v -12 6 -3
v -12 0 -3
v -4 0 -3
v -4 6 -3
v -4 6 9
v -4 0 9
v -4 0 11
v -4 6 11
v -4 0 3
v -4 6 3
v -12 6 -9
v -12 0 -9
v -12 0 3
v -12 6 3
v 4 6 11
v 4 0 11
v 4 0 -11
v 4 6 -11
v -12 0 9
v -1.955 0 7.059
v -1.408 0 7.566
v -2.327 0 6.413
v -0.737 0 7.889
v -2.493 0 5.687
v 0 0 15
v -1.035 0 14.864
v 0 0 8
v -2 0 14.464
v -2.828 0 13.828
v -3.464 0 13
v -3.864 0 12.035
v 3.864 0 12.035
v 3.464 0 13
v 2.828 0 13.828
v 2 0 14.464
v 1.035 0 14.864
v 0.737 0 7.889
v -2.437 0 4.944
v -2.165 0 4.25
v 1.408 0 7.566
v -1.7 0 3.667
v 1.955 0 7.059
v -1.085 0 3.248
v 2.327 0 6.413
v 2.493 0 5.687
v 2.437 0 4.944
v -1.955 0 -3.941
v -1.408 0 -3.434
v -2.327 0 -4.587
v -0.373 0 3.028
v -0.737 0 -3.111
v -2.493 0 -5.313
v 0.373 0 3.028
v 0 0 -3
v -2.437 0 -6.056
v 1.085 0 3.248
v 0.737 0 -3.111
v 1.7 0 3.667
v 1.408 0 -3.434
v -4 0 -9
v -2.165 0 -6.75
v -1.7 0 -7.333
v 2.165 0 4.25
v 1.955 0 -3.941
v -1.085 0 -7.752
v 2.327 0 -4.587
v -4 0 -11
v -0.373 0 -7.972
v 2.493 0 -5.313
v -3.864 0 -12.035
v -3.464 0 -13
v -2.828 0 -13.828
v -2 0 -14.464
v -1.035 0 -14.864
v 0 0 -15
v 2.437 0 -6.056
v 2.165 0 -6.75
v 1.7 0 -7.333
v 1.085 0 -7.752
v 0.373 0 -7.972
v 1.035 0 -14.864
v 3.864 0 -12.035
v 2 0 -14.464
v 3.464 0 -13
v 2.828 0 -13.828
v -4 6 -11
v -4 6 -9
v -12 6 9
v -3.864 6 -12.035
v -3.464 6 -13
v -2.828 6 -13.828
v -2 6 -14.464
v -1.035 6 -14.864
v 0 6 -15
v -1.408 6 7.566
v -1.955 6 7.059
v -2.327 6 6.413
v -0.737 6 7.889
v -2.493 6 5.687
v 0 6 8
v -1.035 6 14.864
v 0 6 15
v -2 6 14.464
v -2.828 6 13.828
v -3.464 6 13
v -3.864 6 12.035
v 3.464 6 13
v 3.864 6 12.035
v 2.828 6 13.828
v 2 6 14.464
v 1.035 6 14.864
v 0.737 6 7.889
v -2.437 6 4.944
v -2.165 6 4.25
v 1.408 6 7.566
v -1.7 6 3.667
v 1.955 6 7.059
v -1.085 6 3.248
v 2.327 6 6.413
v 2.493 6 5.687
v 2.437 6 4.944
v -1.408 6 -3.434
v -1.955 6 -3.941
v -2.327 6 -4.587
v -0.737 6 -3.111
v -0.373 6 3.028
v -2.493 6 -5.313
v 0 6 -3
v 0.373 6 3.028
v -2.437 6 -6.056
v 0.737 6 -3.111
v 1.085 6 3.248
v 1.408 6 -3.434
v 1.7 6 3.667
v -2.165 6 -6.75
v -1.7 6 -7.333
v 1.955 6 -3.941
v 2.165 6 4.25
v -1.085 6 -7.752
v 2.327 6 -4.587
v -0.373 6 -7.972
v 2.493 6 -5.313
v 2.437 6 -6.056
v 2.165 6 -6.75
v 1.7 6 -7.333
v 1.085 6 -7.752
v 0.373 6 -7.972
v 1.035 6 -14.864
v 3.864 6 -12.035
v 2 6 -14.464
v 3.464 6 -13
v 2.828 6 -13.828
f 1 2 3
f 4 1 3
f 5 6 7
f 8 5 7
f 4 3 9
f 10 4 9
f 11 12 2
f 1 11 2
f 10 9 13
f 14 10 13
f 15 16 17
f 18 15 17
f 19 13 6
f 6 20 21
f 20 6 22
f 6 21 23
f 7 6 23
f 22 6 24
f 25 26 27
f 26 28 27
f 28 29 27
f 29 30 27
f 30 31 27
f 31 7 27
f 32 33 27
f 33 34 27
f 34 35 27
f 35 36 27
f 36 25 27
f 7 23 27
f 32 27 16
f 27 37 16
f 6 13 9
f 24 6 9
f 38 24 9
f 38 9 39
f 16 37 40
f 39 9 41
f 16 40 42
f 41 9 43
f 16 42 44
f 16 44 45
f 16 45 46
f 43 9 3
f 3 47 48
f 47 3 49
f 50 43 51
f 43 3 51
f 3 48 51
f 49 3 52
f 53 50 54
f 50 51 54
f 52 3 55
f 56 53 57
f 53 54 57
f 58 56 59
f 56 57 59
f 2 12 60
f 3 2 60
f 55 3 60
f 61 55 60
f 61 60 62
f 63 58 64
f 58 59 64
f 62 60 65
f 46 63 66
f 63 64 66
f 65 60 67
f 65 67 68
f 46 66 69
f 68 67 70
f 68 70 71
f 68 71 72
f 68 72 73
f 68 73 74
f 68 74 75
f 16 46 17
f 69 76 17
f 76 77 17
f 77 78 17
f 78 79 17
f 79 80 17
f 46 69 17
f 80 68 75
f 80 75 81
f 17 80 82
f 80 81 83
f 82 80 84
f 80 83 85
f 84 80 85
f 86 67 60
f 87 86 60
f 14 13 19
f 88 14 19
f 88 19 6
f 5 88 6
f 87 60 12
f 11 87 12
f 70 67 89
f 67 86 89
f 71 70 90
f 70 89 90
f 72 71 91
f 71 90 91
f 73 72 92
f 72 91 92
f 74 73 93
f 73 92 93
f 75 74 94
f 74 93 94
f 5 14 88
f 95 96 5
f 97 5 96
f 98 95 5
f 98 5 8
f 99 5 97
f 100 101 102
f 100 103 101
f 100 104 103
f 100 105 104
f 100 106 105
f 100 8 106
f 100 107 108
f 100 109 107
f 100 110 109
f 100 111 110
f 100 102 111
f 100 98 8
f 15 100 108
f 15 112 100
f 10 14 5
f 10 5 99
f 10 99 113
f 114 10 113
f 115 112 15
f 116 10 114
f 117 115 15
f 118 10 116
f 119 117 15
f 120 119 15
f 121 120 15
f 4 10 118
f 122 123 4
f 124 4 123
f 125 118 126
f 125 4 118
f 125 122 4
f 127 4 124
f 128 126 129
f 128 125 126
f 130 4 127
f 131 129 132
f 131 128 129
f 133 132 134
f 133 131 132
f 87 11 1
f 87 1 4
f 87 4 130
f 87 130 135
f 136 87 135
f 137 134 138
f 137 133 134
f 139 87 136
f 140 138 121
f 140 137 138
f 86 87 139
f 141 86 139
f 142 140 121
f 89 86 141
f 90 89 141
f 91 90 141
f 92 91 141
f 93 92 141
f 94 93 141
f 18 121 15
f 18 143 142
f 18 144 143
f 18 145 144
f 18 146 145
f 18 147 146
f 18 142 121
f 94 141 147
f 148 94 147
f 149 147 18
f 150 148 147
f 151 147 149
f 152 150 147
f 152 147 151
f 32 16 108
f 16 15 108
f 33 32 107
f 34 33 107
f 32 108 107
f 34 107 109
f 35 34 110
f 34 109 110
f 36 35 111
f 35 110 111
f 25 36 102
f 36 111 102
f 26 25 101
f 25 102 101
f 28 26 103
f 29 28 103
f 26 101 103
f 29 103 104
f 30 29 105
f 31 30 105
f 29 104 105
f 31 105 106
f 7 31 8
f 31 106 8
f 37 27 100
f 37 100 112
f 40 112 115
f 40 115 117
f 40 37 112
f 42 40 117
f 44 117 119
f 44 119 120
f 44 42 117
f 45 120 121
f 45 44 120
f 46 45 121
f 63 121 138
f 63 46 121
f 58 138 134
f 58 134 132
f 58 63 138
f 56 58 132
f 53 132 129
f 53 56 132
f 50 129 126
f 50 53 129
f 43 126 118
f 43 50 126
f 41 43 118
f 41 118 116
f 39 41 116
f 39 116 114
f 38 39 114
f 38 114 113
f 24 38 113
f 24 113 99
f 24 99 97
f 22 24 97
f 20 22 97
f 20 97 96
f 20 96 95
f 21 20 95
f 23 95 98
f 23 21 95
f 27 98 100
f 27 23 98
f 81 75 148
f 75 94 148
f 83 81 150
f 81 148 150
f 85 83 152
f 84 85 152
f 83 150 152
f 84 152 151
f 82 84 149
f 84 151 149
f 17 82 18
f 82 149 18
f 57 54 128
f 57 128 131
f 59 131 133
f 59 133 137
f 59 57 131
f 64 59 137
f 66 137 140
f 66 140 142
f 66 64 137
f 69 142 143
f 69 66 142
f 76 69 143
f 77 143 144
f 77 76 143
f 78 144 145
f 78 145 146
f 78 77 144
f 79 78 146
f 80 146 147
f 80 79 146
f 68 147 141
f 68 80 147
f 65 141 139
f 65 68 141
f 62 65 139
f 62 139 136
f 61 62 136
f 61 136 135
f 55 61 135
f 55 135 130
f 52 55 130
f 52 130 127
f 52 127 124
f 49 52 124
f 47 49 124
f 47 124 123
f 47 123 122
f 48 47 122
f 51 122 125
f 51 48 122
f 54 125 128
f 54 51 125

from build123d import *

# Parameters (mm, degrees)
SKETCH1_R           = 2.5
BOSS_EXTRUDE1_DEPTH = 6
FILLET1_R           = 4


with BuildPart() as part:
    # Sketch1 → Boss-Extrude1 (new body)
    with BuildSketch(Plane(origin=(0, 0, 0), x_dir=(1, 0, 0), z_dir=(0, 1, 0))):
        Polygon((-4, 14.999990394), (-4, 8.999990394), (-12, 8.999990394), (-12, 2.999990394), (-4, 2.999990394), (-4, -3.000009606), (-12, -3.000009606), (-12, -9.000009606), (-4, -9.000009606), (-4, -15.000009606), (4, -15.000009606), (4, 14.999990394), align=None)
        with Locations(Location((0, 5.5, 0), (0, 0, 270))):
            Circle(SKETCH1_R, mode=Mode.SUBTRACT)
        with Locations(Location((0, -5.5, 0), (0, 0, 270))):
            Circle(SKETCH1_R, mode=Mode.SUBTRACT)
    extrude(amount=BOSS_EXTRUDE1_DEPTH)

    # Fillet1
    fillet1_edges = [part.edges().sort_by_distance(p)[0] for p in [
        (-4, 3, 15.000009606),
        (-4, 3, -14.999990394),
        (4, 3, 15.000009606),
        (4, 3, -14.999990394),
    ]]
    fillet(fillet1_edges, radius=FILLET1_R - 0.0001)  # a hair under: the kernel refuses the full size


solid = part.part
